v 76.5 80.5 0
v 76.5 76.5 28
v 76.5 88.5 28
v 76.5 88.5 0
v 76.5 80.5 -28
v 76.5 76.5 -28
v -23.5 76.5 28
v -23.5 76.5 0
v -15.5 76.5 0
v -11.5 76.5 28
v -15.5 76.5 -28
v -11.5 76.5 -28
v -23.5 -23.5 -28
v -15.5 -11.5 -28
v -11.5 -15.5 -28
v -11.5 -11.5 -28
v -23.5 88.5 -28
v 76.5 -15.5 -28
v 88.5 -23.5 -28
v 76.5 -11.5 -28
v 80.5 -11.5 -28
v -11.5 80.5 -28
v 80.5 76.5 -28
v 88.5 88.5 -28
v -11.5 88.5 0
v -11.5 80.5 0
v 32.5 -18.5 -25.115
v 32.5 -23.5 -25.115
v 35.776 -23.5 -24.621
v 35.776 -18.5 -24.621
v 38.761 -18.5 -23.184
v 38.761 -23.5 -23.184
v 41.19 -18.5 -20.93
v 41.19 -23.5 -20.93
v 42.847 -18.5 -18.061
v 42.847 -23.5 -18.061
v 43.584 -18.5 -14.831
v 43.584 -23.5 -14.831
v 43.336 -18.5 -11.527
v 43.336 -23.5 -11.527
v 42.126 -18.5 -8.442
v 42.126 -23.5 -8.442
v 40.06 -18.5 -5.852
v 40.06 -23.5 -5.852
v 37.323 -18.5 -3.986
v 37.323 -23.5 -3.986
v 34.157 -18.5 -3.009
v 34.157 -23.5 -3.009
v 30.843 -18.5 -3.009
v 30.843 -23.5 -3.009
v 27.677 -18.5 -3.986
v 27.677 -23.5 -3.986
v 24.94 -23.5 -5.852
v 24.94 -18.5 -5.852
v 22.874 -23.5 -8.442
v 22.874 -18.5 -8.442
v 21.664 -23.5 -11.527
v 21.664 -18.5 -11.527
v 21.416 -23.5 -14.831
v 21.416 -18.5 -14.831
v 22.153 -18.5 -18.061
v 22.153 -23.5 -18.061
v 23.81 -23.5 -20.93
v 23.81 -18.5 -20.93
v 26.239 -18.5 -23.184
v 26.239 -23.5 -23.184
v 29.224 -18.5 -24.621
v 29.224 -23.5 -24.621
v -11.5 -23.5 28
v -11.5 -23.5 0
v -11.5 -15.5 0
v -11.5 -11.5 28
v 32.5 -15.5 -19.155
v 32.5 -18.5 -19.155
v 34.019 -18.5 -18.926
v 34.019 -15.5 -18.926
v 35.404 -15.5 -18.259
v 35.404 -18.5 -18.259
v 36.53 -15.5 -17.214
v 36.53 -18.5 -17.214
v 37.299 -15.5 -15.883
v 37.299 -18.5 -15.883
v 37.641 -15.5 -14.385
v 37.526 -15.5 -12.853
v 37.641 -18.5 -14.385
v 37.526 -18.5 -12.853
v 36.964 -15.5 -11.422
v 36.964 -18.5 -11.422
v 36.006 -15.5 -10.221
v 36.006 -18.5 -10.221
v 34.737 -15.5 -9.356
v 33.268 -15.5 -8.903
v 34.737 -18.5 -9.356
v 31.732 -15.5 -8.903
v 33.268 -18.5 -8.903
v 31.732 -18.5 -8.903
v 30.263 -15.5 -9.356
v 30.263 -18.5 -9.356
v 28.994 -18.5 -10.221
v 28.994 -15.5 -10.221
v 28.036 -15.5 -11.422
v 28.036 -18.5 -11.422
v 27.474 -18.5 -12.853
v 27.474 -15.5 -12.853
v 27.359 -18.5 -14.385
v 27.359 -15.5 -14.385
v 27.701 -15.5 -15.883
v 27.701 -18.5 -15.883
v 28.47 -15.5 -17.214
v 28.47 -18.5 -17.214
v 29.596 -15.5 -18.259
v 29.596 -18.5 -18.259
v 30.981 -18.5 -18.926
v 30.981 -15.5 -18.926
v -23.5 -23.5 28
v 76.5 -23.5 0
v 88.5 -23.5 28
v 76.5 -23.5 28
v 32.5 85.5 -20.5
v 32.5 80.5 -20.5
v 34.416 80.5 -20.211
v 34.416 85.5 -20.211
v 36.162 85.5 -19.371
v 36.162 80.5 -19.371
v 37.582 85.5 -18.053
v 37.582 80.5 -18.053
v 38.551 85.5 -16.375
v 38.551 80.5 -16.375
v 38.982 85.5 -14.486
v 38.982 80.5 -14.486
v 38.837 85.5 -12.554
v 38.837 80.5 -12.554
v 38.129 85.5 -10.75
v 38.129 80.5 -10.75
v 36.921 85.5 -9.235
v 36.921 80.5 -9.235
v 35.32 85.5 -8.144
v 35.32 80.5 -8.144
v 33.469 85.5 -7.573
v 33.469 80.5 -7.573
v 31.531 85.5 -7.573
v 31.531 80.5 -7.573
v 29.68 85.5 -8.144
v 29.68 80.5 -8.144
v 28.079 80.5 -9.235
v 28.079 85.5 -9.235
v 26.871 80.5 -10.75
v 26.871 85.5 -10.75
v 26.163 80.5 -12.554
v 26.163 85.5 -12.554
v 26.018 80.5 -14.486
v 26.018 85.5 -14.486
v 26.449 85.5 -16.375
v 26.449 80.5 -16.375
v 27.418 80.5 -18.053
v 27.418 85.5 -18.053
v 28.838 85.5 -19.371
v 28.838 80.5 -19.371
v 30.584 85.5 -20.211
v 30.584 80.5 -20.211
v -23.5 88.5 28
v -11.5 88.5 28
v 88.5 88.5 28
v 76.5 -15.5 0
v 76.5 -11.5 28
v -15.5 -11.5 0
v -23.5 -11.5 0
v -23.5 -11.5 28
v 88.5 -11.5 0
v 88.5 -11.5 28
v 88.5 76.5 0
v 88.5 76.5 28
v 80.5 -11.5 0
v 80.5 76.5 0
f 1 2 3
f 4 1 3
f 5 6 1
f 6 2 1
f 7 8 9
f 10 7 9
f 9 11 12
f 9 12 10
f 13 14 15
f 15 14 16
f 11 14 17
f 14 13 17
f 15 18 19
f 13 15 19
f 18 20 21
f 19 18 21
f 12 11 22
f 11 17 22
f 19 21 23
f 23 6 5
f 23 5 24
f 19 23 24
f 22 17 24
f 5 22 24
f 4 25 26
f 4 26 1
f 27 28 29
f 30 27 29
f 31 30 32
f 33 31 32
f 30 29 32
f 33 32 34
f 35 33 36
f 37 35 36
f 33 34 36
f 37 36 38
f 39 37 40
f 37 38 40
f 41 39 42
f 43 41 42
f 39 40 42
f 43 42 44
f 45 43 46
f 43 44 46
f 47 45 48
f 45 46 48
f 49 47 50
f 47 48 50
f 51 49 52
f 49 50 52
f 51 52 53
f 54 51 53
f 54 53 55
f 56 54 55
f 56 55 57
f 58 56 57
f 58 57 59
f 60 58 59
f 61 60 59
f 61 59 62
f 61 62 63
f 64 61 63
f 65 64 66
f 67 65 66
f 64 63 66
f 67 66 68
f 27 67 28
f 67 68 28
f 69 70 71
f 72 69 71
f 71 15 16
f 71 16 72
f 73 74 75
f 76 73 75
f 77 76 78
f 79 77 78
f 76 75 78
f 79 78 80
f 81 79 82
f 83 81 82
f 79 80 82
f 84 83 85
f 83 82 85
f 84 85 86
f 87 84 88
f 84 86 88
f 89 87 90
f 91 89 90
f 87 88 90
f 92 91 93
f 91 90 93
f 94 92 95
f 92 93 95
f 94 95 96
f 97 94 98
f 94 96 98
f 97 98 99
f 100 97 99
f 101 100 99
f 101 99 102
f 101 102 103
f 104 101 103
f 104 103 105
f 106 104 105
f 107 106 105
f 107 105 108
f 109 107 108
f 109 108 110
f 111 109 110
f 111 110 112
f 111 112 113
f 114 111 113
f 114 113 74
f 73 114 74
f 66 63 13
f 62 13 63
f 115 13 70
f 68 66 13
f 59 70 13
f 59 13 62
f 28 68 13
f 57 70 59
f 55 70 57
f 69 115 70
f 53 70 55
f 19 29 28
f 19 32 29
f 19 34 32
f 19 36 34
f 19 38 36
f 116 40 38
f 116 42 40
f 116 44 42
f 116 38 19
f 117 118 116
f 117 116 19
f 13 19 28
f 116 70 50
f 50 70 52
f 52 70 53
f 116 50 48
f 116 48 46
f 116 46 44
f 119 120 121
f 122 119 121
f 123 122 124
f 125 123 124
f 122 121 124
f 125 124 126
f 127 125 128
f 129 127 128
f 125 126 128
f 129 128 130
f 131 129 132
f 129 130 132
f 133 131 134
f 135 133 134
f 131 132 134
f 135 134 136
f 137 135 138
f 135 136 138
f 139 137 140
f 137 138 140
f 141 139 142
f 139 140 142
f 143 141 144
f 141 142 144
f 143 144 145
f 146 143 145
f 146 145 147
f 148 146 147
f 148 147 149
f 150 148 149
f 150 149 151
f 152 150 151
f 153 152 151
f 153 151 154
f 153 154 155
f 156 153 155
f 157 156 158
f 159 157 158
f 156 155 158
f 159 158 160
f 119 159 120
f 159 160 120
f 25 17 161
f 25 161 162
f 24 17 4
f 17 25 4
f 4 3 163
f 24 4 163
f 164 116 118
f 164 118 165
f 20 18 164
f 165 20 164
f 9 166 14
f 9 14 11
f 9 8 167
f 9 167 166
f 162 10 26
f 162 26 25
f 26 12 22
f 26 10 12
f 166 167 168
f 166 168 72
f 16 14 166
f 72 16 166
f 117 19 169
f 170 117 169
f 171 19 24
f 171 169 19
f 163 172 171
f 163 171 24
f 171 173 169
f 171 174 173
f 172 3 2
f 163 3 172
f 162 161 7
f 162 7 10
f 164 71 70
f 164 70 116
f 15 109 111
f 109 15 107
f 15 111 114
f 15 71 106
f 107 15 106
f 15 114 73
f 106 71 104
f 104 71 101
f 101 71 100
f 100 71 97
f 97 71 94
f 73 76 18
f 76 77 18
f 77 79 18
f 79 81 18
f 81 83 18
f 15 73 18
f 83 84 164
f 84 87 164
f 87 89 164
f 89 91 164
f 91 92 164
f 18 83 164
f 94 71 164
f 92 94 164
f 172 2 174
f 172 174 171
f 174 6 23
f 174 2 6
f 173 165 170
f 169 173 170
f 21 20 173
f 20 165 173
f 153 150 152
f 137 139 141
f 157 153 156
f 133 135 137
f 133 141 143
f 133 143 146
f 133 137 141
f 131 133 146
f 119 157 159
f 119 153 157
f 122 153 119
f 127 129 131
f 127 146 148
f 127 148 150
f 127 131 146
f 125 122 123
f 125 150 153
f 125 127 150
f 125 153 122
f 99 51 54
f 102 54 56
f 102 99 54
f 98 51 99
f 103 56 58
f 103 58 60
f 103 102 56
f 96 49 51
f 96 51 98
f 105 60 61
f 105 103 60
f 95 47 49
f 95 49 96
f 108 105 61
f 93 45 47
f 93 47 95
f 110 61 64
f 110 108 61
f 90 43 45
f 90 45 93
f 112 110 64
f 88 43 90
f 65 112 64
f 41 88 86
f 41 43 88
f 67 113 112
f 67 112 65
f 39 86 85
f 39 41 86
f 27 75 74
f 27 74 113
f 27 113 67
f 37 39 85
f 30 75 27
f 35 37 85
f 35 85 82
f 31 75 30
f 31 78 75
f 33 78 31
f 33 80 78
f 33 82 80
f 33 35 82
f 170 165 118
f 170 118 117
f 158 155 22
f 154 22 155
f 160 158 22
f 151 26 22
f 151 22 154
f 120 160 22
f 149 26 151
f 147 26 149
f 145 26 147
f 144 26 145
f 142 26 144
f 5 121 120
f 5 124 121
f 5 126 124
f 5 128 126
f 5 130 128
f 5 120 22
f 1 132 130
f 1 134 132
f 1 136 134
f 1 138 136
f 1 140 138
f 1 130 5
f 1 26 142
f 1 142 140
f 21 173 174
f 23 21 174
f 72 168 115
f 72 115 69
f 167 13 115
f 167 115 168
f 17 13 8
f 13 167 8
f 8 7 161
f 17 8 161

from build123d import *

# Parameters (mm, degrees)
CROQUIS1_W                   = 112
CROQUIS1_H                   = 112
CROQUIS1_W_2                 = 96
CROQUIS1_H_2                 = 96
SALIENTE_EXTRUIR2_DEPTH      = 28
CROQUIS2_R                   = 5.155
CORTAR_EXTRUIR1_DEPTH        = 8
CROQUIS3_R                   = 11.115
CORTAR_EXTRUIR2_DEPTH        = 5
CROQUIS4_R                   = 6.5
CORTAR_EXTRUIR3_DEPTH        = 5
SALIENTE_EXTRUIR3_DEPTH      = 28
SALIENTE_EXTRUIR3_DEPTH_BACK = 28
CROQUIS5_W                   = 12
CROQUIS5_H                   = 12


with BuildPart() as part:
    # Croquis1 → Saliente-Extruir2 (new body)
    with BuildSketch(Plane.XY):
        with Locations((32.5, 32.5)):
            Rectangle(CROQUIS1_W, CROQUIS1_H)
        with Locations((32.5, 32.5)):
            Rectangle(CROQUIS1_W_2, CROQUIS1_H_2, mode=Mode.SUBTRACT)
    extrude(amount=-SALIENTE_EXTRUIR2_DEPTH)

    # Croquis2 → Cortar-Extruir1 (cut)
    with BuildSketch(Plane.XZ.offset(23.5)):
        with Locations((32.5, -14)):
            Circle(CROQUIS2_R)
    extrude(amount=-CORTAR_EXTRUIR1_DEPTH, mode=Mode.SUBTRACT)

    # Croquis3 → Cortar-Extruir2 (cut)
    with BuildSketch(Plane.XZ.offset(23.5)):
        with Locations((32.5, -14)):
            Circle(CROQUIS3_R)
    extrude(amount=-CORTAR_EXTRUIR2_DEPTH, mode=Mode.SUBTRACT)

    # Croquis4 → Cortar-Extruir3 (cut)
    with BuildSketch(Plane.XZ.offset(-80.5)):
        with Locations((32.5, -14)):
            Circle(CROQUIS4_R)
    extrude(amount=-CORTAR_EXTRUIR3_DEPTH, mode=Mode.SUBTRACT)

    # Croquis5 → Saliente-Extruir3 (add, two sides: drawn at the far end of the back side and taken through both)
    with BuildSketch(Plane.XY.offset(-SALIENTE_EXTRUIR3_DEPTH_BACK)):
        with Locations((-17.5, 82.5)):
            Rectangle(CROQUIS5_W, CROQUIS5_H)
        with Locations((-17.5, -17.5)):
            Rectangle(CROQUIS5_W, CROQUIS5_H)
        with Locations((82.5, -17.5)):
            Rectangle(CROQUIS5_W, CROQUIS5_H)
        with Locations((82.5, 82.5)):
            Rectangle(CROQUIS5_W, CROQUIS5_H)
    extrude(amount=SALIENTE_EXTRUIR3_DEPTH + SALIENTE_EXTRUIR3_DEPTH_BACK)


solid = part.part
